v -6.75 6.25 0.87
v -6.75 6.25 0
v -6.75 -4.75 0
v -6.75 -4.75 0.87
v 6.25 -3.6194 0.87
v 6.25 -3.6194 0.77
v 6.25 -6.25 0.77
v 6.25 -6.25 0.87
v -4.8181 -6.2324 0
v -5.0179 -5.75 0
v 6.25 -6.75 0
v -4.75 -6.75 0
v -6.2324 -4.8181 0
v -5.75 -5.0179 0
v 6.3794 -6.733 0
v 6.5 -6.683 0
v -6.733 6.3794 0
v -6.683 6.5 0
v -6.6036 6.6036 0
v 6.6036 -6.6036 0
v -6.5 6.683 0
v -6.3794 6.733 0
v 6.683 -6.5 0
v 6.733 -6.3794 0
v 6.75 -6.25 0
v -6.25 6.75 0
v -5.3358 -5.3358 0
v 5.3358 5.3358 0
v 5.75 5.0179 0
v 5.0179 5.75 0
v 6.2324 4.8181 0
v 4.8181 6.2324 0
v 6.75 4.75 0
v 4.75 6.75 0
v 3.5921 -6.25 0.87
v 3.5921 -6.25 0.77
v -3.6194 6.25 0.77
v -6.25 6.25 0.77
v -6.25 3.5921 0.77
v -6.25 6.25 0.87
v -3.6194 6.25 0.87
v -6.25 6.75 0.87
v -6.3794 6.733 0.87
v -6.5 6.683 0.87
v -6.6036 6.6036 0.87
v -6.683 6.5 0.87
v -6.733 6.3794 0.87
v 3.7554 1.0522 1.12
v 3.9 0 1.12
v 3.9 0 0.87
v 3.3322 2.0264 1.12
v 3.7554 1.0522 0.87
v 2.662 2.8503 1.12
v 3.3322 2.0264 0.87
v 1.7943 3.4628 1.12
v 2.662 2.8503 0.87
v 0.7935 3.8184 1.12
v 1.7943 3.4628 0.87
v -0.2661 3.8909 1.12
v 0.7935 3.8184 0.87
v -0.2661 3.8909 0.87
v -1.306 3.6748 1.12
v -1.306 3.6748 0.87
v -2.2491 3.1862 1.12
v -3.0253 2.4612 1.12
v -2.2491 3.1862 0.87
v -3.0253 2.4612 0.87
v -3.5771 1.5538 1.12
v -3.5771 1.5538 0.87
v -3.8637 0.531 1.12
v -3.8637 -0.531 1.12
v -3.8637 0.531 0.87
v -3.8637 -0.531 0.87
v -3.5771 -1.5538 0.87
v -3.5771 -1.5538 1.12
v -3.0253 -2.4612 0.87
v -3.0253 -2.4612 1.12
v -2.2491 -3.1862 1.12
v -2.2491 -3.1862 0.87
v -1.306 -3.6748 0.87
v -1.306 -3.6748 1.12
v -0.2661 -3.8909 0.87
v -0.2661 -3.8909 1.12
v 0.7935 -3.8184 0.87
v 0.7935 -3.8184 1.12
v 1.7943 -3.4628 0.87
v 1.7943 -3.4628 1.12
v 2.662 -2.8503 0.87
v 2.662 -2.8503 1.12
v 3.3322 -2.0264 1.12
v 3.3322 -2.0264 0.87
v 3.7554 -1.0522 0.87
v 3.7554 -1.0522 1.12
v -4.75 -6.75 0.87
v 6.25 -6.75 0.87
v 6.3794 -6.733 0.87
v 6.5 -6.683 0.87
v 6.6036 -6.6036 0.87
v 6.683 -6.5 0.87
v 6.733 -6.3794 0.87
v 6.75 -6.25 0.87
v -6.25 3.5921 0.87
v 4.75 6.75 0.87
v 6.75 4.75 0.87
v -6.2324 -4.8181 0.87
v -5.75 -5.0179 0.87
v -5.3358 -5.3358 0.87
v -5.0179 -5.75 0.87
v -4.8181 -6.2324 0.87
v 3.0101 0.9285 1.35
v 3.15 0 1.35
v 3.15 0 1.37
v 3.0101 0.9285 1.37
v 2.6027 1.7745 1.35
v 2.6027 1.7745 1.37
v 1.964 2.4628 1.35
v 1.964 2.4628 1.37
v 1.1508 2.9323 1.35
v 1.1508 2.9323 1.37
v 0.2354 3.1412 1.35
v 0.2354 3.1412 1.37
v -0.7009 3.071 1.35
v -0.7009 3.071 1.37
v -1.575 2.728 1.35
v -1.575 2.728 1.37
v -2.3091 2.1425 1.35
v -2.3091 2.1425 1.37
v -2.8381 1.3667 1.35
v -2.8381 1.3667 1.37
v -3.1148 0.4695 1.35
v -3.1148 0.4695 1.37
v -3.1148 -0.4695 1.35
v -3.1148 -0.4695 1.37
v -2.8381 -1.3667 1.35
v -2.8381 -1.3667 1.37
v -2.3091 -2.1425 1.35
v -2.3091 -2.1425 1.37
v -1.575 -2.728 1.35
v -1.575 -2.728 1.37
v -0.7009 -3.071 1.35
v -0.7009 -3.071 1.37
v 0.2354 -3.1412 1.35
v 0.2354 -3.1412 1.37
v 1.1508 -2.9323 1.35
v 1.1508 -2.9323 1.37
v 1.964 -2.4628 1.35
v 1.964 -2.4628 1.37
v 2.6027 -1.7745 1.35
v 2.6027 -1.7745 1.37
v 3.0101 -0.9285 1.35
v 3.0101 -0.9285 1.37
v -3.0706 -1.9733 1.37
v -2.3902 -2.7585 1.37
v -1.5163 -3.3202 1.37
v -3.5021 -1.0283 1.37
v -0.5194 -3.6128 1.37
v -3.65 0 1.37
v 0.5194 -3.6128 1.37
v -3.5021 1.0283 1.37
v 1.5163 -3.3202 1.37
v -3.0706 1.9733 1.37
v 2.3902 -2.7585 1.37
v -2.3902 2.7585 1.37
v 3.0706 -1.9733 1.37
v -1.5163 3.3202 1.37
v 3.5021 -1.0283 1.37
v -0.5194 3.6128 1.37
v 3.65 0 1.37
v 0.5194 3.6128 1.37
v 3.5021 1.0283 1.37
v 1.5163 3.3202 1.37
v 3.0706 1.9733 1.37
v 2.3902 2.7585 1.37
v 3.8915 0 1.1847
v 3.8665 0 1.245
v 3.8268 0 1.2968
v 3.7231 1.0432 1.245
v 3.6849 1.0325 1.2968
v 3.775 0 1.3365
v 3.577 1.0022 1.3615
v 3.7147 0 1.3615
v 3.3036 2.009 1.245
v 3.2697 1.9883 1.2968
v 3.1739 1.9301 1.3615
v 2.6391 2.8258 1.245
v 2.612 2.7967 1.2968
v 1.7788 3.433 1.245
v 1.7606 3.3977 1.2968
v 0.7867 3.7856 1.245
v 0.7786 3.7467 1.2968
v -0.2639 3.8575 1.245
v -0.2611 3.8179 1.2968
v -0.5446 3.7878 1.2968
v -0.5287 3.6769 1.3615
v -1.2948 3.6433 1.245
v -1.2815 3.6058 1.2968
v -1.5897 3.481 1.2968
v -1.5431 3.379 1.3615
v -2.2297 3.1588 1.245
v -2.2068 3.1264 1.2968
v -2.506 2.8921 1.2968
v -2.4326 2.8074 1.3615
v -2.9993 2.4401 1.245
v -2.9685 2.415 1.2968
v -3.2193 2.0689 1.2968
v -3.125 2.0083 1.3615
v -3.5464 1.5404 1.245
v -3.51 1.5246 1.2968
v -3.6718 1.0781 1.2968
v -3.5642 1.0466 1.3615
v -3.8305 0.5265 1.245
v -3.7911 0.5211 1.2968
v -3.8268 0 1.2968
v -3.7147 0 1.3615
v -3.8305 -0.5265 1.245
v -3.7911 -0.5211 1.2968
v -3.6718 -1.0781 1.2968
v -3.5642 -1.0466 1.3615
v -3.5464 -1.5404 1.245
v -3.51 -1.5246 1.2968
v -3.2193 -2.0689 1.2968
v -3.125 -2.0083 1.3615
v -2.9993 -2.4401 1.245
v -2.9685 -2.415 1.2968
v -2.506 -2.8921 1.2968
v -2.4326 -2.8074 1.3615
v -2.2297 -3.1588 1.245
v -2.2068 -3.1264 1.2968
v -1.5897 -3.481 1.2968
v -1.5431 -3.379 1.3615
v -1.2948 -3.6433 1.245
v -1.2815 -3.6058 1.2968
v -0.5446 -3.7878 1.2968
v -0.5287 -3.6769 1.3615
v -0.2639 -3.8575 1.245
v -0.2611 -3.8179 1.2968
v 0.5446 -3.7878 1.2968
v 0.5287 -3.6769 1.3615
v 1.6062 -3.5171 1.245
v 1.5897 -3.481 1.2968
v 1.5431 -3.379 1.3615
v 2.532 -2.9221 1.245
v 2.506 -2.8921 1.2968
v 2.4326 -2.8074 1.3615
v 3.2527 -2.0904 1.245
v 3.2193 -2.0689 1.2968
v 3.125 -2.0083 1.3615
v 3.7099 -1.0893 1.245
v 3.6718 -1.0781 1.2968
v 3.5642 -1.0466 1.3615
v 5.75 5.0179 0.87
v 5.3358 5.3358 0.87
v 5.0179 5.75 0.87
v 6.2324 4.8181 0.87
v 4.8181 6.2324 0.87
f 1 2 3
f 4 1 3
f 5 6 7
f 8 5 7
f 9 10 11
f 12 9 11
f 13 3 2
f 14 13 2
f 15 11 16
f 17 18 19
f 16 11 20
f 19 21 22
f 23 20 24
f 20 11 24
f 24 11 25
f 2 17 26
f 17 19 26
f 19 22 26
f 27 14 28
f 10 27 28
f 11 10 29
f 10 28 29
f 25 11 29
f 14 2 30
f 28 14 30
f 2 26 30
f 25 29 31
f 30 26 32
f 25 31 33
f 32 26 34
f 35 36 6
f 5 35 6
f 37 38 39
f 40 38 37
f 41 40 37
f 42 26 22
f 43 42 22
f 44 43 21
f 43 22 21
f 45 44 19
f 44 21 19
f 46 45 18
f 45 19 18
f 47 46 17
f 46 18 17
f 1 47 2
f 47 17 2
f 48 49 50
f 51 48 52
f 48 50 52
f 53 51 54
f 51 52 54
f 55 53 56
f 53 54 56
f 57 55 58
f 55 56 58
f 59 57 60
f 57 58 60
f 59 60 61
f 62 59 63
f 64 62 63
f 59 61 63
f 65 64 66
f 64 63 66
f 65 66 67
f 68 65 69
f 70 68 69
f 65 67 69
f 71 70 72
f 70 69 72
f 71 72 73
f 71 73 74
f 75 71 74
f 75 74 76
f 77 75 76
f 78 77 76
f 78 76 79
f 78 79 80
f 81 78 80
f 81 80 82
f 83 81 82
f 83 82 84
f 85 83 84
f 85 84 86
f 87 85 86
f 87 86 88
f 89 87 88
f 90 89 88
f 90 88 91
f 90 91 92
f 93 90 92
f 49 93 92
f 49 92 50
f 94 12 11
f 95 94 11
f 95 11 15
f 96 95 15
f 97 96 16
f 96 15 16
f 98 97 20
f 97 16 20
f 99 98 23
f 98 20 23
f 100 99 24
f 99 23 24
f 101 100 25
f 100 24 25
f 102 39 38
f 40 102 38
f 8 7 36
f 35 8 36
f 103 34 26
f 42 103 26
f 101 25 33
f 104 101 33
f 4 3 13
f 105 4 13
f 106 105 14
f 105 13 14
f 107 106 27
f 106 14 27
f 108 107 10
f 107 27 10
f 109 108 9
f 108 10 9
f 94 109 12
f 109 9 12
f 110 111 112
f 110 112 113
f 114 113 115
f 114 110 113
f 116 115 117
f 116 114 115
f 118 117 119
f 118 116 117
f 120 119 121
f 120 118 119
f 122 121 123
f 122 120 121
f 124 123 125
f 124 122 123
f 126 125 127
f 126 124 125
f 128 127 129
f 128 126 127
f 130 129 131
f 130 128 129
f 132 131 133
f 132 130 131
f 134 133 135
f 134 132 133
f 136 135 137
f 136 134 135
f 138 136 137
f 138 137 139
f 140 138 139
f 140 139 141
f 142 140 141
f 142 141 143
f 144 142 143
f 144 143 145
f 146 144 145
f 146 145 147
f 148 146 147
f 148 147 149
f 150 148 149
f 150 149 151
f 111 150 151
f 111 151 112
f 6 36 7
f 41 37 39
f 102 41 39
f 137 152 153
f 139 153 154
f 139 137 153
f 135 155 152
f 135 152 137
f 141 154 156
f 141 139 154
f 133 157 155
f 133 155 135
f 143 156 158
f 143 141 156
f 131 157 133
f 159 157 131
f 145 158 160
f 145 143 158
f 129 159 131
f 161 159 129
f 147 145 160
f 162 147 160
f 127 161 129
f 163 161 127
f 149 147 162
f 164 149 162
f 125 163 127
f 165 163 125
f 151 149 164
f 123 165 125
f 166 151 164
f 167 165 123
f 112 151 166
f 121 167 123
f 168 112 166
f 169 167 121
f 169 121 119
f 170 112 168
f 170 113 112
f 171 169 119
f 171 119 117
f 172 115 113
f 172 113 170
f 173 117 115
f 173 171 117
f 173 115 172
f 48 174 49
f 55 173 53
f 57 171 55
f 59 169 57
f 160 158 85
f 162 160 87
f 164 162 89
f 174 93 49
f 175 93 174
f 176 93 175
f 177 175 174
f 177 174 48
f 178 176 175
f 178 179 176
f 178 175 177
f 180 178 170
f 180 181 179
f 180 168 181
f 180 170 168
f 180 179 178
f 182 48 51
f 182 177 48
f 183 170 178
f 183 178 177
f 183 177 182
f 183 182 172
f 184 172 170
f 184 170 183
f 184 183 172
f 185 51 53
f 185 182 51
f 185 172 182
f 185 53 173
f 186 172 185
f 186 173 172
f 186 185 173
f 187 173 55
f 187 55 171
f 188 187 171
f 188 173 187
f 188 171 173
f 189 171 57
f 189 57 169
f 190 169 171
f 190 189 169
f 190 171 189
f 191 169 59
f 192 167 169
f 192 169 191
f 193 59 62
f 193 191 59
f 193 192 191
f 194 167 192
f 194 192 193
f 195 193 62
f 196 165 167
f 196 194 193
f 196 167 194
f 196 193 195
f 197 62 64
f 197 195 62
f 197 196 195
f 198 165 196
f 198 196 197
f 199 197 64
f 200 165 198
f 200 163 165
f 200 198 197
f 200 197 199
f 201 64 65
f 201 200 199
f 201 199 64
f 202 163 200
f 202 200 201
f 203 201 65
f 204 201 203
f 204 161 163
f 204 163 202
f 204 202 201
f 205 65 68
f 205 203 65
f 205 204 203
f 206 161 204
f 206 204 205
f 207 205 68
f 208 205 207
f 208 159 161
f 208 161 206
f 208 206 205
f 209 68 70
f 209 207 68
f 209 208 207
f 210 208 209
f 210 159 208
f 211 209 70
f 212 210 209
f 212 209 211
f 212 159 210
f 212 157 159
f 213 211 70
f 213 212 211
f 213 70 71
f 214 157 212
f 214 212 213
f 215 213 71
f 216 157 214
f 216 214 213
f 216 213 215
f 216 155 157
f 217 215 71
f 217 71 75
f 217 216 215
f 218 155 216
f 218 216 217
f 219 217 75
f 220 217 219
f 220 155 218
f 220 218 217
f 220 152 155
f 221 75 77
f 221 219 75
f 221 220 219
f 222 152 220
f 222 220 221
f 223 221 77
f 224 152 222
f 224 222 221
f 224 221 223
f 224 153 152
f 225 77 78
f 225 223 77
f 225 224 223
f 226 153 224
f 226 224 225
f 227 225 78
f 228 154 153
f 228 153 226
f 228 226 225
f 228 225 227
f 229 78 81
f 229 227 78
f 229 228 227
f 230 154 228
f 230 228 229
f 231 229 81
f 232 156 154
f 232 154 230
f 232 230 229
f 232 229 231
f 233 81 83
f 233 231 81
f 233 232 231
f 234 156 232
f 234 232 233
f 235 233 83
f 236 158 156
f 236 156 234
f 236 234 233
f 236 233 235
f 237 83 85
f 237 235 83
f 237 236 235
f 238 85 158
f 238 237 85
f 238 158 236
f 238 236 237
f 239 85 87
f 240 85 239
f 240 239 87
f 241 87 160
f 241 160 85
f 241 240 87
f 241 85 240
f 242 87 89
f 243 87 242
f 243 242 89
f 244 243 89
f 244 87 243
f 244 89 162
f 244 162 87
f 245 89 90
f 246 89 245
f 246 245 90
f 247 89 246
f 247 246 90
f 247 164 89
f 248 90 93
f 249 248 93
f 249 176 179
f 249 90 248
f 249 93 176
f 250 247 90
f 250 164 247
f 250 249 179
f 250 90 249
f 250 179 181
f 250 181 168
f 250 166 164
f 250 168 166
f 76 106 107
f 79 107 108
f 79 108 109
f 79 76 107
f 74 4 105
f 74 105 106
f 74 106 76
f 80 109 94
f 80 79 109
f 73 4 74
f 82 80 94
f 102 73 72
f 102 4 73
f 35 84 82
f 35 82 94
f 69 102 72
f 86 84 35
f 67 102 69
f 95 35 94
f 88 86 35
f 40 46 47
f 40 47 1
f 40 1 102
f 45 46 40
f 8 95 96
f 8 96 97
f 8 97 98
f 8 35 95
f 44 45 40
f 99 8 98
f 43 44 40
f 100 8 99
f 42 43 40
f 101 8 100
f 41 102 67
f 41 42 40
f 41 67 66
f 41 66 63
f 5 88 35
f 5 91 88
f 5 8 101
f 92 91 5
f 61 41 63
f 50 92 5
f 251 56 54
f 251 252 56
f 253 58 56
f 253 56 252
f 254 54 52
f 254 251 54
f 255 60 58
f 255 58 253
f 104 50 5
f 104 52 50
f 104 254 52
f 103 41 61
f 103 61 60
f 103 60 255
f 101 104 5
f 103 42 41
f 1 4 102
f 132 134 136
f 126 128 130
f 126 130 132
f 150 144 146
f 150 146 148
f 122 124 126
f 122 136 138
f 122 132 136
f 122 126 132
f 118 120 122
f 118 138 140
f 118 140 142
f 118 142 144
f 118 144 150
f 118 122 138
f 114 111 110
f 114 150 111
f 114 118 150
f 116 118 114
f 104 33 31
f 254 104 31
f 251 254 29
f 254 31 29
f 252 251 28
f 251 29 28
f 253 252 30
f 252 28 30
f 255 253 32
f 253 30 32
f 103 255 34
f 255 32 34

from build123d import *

# Parameters (mm, degrees)
F0_R     = 3.9
F0_R_2   = 3.15
F1_DEPTH = 0.87
F2_DEPTH = 0.77
F3_DEPTH = 1.37
F4_DEPTH = 1.35
F5_R     = 0.25


with BuildPart() as f1:
    # F0 (on Top) → F1 (new body)
    with BuildSketch(Plane.XY):
        with BuildLine():
            Line((-4.75, -6.75), (6.25, -6.75))
            ThreePointArc((6.25, -6.75), (6.603553, -6.603553), (6.75, -6.25))
            Line((6.75, -6.25), (6.75, 4.75))
            ThreePointArc((6.75, 4.75), (5.335786, 5.335786), (4.75, 6.75))
            Line((4.75, 6.75), (-6.25, 6.75))
            ThreePointArc((-6.25, 6.75), (-6.603553, 6.603553), (-6.75, 6.25))
            Line((-6.75, 6.25), (-6.75, -4.75))
            ThreePointArc((-6.75, -4.75), (-5.335786, -5.335786), (-4.75, -6.75))
        make_face()
        Polygon((6.25, -6.25), (3.592141, -6.25), (6.25, -3.619419), align=None, mode=Mode.SUBTRACT)
        Polygon((-6.25, 3.592141), (-6.25, 6.25), (-3.619419, 6.25), align=None, mode=Mode.SUBTRACT)
        Circle(F0_R, mode=Mode.SUBTRACT)
        Circle(F0_R)
        Circle(F0_R_2, mode=Mode.SUBTRACT)
        Circle(F0_R_2)
    extrude(amount=F1_DEPTH)

    # F0 (on Top) → F2 (join)
    with BuildSketch(Plane.XY):
        Polygon((-3.619419, 6.25), (-6.25, 6.25), (-6.25, 3.592141), align=None)
        Polygon((6.25, -3.619419), (3.592141, -6.25), (6.25, -6.25), align=None)
    extrude(amount=F2_DEPTH)

    # F0 (on Top) → F3 (join)
    with BuildSketch(Plane.XY):
        Circle(F0_R)
        Circle(F0_R_2, mode=Mode.SUBTRACT)
    extrude(amount=F3_DEPTH)

    # F0 (on Top) → F4 (join)
    with BuildSketch(Plane.XY):
        Circle(F0_R_2)
    extrude(amount=F4_DEPTH)

    # F5
    f5_edges = [f1.edges().sort_by_distance(p)[0] for p in [
        (-3.9, 0, 1.37),
    ]]
    fillet(f5_edges, radius=F5_R)


solid = f1.part
